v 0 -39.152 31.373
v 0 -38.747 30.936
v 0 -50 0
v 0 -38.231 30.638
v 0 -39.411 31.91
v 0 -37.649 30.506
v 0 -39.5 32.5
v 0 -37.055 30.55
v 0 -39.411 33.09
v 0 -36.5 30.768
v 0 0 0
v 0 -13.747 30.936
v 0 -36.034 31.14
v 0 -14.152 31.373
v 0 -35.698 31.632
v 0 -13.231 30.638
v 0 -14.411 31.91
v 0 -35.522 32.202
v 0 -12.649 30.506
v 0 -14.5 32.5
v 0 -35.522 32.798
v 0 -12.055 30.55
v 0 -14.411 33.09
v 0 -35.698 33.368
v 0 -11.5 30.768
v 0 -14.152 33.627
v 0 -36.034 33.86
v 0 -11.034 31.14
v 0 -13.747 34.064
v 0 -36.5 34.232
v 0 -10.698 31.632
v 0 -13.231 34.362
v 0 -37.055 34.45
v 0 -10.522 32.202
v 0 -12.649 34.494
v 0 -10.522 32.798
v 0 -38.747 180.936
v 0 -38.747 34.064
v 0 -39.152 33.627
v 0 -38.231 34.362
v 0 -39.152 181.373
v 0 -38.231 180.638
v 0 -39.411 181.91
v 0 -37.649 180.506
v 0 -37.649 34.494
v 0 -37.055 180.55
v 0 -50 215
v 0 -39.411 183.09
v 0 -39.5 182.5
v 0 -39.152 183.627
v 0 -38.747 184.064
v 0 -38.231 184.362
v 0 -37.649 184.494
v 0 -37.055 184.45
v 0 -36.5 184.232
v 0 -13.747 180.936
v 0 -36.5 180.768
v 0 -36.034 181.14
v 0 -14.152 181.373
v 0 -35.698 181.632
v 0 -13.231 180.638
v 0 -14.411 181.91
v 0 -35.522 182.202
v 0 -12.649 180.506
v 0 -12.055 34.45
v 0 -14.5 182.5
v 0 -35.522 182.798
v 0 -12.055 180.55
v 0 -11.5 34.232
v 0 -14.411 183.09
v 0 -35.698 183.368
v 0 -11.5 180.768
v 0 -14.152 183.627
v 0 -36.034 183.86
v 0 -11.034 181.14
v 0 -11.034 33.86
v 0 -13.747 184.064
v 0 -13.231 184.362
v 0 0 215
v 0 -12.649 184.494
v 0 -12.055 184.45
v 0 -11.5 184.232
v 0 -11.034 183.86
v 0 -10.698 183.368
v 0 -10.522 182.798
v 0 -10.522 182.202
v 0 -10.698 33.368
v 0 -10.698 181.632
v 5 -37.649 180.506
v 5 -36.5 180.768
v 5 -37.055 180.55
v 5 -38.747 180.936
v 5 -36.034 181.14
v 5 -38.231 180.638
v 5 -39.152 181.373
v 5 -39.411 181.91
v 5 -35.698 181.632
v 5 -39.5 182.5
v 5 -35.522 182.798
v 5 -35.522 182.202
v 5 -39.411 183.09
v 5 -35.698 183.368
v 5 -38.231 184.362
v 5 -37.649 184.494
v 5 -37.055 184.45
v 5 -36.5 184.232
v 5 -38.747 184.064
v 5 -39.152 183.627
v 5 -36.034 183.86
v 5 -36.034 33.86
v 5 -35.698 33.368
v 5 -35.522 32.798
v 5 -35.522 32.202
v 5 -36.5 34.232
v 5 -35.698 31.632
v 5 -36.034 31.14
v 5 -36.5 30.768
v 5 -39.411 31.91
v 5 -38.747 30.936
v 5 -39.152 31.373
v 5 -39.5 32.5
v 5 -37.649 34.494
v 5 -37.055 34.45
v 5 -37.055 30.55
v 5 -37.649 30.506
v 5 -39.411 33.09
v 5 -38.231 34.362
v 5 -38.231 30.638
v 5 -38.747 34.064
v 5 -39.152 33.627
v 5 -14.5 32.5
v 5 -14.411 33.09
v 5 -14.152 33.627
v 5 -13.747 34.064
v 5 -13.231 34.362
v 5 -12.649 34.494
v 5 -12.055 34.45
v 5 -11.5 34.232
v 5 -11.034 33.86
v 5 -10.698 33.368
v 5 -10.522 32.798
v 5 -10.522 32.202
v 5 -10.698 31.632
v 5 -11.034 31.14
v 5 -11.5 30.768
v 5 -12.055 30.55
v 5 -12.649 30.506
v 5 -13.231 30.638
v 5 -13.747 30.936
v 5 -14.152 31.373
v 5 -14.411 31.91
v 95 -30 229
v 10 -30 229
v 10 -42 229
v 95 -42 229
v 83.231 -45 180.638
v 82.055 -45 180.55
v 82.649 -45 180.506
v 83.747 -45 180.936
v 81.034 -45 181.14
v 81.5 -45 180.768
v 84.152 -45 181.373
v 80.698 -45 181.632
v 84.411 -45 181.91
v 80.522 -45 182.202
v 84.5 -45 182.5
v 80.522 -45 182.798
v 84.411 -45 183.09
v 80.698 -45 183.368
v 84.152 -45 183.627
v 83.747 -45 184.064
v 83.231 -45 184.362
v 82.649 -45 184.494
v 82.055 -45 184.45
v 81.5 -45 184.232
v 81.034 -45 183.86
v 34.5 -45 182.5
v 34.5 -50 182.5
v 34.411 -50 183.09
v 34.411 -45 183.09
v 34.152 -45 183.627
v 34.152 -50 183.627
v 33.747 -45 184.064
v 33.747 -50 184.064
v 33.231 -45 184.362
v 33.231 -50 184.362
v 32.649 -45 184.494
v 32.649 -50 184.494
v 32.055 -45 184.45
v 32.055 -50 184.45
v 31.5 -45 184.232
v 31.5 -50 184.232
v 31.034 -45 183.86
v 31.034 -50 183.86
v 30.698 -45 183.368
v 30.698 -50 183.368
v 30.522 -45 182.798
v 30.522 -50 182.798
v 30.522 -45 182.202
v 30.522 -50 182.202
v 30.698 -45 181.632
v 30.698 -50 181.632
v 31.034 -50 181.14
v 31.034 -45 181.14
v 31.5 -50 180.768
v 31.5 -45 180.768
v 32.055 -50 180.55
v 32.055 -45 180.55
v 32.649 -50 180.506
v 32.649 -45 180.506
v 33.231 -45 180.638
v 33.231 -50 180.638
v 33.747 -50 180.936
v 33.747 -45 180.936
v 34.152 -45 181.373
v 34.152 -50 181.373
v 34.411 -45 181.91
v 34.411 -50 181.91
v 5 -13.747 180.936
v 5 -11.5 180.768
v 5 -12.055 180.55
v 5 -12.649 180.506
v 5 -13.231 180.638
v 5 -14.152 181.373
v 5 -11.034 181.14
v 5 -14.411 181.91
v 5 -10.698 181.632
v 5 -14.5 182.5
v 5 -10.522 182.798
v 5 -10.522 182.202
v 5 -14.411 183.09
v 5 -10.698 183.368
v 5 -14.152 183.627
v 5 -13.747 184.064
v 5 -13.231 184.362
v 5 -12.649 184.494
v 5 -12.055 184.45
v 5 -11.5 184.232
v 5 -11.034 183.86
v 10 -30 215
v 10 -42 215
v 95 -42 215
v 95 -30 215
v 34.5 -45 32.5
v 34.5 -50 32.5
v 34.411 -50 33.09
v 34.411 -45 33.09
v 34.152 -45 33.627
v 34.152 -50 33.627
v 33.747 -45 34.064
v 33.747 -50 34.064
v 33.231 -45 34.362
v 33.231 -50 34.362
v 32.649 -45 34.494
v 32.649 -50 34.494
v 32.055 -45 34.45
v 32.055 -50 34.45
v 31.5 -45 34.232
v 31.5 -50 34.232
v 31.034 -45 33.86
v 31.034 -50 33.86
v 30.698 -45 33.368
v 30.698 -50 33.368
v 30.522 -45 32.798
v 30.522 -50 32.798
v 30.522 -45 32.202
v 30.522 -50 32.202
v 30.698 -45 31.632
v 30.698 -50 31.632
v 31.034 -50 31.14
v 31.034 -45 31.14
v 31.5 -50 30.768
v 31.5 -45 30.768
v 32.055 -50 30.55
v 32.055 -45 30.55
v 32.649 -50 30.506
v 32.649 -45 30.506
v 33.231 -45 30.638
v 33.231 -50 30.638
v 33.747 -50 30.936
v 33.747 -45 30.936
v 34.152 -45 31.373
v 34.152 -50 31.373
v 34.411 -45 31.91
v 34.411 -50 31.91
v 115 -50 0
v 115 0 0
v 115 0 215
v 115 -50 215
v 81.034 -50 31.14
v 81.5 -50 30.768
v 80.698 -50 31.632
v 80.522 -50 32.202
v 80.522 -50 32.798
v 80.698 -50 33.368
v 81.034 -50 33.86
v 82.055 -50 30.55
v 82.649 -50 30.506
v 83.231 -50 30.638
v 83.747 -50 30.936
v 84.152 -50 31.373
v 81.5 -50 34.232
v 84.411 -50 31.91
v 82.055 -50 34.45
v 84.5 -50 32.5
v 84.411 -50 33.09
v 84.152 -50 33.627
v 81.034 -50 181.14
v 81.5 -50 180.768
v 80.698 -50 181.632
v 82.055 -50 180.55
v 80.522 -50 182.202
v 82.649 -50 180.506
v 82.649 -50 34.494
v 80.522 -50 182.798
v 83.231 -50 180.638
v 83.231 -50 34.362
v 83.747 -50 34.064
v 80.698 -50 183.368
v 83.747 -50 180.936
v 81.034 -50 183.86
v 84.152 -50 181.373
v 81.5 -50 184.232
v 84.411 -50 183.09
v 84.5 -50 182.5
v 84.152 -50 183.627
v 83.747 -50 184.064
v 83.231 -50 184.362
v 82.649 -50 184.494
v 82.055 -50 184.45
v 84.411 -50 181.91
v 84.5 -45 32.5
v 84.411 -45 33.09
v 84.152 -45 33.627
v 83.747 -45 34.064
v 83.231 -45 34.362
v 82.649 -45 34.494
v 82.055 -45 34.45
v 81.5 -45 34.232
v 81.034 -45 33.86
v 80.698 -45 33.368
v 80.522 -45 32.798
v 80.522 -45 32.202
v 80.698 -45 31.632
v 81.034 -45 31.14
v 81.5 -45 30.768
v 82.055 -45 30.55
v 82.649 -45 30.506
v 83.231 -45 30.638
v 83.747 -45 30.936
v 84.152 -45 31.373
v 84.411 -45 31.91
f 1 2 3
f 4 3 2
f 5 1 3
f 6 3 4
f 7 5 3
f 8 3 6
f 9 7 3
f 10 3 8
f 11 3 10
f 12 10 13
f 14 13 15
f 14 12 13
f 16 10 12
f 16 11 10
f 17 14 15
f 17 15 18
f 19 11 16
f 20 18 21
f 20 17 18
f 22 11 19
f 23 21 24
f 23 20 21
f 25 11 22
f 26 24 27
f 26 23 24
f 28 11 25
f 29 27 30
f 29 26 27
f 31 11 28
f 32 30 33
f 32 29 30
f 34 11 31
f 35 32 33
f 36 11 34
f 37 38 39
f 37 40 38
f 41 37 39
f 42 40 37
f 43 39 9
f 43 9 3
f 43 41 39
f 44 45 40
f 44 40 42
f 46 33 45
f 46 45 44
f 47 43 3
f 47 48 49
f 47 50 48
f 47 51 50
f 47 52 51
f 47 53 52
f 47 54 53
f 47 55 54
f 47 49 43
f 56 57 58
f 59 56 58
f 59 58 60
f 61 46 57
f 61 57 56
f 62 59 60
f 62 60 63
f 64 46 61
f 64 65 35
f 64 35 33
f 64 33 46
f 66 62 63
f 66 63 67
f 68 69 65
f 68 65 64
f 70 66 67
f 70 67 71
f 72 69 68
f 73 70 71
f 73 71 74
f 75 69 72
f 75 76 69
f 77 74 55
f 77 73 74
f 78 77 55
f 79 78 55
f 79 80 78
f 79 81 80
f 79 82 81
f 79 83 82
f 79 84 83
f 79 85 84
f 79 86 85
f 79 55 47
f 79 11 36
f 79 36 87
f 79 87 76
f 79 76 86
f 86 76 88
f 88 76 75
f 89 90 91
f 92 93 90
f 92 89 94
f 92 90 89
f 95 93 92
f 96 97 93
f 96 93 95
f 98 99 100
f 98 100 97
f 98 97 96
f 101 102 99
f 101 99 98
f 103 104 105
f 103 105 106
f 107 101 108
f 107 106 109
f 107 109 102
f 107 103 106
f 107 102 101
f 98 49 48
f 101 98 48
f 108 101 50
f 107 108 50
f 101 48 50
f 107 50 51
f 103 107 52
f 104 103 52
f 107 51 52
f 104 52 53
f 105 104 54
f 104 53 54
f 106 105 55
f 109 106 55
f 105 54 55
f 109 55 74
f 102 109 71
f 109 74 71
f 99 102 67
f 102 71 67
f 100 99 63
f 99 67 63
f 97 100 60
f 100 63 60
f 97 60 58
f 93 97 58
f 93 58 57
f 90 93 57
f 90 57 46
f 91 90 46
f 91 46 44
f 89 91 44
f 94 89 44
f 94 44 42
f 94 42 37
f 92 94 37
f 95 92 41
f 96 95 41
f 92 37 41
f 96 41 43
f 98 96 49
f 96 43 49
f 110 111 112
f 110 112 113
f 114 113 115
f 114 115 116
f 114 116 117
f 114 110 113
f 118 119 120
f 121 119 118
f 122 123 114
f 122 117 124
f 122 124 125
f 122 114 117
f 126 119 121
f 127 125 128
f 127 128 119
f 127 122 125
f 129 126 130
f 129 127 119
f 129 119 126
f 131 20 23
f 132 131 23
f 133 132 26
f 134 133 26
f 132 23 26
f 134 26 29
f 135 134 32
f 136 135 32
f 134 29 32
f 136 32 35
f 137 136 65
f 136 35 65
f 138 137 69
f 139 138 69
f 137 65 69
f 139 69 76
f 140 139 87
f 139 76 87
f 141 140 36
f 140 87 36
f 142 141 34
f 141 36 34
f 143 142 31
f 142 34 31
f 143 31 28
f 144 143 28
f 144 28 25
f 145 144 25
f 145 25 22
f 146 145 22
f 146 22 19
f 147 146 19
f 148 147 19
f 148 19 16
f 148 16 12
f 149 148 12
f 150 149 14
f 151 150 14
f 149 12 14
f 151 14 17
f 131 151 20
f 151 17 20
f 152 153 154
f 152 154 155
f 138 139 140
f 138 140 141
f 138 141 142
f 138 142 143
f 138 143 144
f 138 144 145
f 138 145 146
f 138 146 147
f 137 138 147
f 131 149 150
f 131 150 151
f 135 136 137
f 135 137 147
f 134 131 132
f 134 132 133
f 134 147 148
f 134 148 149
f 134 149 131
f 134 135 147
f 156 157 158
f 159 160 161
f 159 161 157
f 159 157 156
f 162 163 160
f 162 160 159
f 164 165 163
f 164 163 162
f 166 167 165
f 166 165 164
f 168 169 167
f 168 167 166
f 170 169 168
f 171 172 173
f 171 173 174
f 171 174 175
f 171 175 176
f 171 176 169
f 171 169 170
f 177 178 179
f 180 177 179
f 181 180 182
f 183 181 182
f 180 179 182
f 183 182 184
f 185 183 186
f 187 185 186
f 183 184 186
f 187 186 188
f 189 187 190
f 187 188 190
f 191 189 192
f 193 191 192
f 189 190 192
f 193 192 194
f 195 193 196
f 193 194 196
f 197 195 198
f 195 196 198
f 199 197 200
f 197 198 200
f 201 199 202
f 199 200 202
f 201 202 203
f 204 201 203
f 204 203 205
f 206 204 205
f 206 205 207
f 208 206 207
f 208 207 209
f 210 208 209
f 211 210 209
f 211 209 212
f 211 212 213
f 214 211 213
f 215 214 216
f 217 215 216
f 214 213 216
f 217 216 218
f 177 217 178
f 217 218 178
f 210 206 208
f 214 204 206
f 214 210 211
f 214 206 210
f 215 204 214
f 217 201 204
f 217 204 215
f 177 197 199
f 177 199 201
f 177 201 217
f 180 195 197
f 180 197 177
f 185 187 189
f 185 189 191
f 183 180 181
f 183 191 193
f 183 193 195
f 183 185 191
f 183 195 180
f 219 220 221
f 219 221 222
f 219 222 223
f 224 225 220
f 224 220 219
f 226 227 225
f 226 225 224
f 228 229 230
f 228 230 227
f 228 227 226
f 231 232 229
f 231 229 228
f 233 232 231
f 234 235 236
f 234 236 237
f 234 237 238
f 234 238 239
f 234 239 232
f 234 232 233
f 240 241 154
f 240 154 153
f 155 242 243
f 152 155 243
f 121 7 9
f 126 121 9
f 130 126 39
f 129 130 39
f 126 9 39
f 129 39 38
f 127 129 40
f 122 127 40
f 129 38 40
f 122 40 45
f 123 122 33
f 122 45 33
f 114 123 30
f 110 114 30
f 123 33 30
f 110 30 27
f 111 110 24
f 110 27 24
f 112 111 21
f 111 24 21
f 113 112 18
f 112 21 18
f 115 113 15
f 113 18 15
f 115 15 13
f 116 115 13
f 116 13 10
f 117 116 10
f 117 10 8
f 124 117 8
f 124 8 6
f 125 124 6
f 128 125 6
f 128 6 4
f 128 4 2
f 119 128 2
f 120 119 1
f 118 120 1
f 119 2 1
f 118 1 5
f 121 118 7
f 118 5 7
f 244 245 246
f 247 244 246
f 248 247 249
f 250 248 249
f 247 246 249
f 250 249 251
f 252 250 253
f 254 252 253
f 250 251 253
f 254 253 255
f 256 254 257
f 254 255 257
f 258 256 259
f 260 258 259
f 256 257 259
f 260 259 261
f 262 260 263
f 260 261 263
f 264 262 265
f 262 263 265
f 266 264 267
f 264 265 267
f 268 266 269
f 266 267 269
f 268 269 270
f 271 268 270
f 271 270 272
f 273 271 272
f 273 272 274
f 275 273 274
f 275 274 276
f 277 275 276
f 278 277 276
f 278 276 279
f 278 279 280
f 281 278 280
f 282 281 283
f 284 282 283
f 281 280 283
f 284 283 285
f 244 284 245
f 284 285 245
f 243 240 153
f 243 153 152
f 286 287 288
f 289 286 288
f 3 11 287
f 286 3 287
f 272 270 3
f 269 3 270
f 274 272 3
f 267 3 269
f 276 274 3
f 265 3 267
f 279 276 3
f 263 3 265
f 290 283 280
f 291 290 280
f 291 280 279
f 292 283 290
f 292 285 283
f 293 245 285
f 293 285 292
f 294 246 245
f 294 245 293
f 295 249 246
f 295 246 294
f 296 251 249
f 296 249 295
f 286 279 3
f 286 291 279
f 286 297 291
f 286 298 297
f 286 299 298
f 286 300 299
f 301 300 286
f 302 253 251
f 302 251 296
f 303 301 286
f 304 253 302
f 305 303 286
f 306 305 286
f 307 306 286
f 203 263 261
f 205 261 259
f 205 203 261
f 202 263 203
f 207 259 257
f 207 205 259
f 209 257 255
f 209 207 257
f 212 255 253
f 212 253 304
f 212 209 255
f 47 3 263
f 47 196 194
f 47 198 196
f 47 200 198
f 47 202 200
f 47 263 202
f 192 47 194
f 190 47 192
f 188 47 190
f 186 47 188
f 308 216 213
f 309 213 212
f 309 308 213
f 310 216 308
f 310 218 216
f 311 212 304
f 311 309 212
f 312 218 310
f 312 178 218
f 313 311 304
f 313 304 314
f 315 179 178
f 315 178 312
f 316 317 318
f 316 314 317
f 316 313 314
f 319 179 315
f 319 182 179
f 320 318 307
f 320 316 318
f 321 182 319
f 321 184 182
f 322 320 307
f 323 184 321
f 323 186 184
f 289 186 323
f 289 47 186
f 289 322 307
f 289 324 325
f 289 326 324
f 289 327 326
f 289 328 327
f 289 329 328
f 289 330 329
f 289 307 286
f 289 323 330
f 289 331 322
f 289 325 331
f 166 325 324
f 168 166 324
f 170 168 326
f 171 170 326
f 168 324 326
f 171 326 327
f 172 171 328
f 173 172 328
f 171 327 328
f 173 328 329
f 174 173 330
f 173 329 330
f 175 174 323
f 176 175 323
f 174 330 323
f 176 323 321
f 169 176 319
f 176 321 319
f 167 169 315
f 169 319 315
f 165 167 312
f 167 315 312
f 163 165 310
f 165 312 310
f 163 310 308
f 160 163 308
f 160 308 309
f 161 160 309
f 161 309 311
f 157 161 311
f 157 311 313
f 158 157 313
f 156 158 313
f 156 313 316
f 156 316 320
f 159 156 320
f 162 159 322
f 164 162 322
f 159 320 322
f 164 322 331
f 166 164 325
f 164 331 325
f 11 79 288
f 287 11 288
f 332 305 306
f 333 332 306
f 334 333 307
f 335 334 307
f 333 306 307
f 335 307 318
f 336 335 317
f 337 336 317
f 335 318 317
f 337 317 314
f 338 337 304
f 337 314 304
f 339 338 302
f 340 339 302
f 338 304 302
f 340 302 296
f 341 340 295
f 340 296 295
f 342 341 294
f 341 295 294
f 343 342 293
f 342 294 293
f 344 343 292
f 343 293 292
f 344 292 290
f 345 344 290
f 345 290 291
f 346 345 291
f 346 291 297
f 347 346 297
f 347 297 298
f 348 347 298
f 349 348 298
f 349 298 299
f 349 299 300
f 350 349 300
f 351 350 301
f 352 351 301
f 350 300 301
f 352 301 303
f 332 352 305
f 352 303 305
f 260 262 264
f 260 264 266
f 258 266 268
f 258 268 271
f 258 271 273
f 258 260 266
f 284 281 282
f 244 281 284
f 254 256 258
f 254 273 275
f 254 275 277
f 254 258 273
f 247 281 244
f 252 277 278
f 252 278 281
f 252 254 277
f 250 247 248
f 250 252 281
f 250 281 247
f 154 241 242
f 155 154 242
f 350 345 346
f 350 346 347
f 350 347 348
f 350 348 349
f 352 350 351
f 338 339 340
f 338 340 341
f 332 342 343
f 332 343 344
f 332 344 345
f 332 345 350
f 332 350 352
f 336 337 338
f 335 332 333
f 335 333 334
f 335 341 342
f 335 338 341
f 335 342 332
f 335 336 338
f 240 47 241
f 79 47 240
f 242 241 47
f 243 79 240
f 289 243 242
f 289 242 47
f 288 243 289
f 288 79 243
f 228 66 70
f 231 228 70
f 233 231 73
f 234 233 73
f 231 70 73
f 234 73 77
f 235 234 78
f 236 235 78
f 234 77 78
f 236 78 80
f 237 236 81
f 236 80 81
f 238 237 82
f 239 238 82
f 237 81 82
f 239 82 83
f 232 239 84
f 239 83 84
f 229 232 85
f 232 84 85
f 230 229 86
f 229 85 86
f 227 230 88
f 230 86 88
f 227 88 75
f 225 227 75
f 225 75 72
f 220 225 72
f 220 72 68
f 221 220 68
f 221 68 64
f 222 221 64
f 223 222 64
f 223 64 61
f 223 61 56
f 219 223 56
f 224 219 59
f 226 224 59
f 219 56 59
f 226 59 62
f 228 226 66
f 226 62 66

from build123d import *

# Parameters (mm, degrees)
F0_W     = 115
F0_H     = 215
F1_DEPTH = 50
F2_W     = 85
F2_H     = 12
F3_DEPTH = 14
F4_R     = 2
F5_DEPTH = 5
F6_R     = 2
F7_DEPTH = 5


with BuildPart() as f1:
    # F0 (on Front) → F1 (new body)
    with BuildSketch(Plane.XZ):
        with Locations((57.5, 107.5)):
            Rectangle(F0_W, F0_H)
    extrude(amount=F1_DEPTH)

    # F2 (on face) → F3 (join)
    with BuildSketch(Plane.XY.offset(215)):
        with Locations((52.5, -36)):
            Rectangle(F2_W, F2_H)
    extrude(amount=F3_DEPTH)

    # F4 (on face) → F5 (cut)
    with BuildSketch(Plane.XZ.offset(50)):
        with Locations((32.5, 182.5)):
            Circle(F4_R)
        with Locations((82.5, 182.5)):
            Circle(F4_R)
        with Locations((82.5, 32.5)):
            Circle(F4_R)
        with Locations((32.5, 32.5)):
            Circle(F4_R)
    extrude(amount=-F5_DEPTH, mode=Mode.SUBTRACT)

    # F6 (on face) → F7 (cut)
    with BuildSketch(Plane(origin=(0, 0, 0), x_dir=(0, -1, 0), z_dir=(-1, 0, 0))):
        with Locations((12.5, 182.5)):
            Circle(F6_R)
        with Locations((37.5, 182.5)):
            Circle(F6_R)
        with Locations((37.5, 32.5)):
            Circle(F6_R)
        with Locations((12.5, 32.5)):
            Circle(F6_R)
    extrude(amount=-F7_DEPTH, mode=Mode.SUBTRACT)


solid = f1.part
